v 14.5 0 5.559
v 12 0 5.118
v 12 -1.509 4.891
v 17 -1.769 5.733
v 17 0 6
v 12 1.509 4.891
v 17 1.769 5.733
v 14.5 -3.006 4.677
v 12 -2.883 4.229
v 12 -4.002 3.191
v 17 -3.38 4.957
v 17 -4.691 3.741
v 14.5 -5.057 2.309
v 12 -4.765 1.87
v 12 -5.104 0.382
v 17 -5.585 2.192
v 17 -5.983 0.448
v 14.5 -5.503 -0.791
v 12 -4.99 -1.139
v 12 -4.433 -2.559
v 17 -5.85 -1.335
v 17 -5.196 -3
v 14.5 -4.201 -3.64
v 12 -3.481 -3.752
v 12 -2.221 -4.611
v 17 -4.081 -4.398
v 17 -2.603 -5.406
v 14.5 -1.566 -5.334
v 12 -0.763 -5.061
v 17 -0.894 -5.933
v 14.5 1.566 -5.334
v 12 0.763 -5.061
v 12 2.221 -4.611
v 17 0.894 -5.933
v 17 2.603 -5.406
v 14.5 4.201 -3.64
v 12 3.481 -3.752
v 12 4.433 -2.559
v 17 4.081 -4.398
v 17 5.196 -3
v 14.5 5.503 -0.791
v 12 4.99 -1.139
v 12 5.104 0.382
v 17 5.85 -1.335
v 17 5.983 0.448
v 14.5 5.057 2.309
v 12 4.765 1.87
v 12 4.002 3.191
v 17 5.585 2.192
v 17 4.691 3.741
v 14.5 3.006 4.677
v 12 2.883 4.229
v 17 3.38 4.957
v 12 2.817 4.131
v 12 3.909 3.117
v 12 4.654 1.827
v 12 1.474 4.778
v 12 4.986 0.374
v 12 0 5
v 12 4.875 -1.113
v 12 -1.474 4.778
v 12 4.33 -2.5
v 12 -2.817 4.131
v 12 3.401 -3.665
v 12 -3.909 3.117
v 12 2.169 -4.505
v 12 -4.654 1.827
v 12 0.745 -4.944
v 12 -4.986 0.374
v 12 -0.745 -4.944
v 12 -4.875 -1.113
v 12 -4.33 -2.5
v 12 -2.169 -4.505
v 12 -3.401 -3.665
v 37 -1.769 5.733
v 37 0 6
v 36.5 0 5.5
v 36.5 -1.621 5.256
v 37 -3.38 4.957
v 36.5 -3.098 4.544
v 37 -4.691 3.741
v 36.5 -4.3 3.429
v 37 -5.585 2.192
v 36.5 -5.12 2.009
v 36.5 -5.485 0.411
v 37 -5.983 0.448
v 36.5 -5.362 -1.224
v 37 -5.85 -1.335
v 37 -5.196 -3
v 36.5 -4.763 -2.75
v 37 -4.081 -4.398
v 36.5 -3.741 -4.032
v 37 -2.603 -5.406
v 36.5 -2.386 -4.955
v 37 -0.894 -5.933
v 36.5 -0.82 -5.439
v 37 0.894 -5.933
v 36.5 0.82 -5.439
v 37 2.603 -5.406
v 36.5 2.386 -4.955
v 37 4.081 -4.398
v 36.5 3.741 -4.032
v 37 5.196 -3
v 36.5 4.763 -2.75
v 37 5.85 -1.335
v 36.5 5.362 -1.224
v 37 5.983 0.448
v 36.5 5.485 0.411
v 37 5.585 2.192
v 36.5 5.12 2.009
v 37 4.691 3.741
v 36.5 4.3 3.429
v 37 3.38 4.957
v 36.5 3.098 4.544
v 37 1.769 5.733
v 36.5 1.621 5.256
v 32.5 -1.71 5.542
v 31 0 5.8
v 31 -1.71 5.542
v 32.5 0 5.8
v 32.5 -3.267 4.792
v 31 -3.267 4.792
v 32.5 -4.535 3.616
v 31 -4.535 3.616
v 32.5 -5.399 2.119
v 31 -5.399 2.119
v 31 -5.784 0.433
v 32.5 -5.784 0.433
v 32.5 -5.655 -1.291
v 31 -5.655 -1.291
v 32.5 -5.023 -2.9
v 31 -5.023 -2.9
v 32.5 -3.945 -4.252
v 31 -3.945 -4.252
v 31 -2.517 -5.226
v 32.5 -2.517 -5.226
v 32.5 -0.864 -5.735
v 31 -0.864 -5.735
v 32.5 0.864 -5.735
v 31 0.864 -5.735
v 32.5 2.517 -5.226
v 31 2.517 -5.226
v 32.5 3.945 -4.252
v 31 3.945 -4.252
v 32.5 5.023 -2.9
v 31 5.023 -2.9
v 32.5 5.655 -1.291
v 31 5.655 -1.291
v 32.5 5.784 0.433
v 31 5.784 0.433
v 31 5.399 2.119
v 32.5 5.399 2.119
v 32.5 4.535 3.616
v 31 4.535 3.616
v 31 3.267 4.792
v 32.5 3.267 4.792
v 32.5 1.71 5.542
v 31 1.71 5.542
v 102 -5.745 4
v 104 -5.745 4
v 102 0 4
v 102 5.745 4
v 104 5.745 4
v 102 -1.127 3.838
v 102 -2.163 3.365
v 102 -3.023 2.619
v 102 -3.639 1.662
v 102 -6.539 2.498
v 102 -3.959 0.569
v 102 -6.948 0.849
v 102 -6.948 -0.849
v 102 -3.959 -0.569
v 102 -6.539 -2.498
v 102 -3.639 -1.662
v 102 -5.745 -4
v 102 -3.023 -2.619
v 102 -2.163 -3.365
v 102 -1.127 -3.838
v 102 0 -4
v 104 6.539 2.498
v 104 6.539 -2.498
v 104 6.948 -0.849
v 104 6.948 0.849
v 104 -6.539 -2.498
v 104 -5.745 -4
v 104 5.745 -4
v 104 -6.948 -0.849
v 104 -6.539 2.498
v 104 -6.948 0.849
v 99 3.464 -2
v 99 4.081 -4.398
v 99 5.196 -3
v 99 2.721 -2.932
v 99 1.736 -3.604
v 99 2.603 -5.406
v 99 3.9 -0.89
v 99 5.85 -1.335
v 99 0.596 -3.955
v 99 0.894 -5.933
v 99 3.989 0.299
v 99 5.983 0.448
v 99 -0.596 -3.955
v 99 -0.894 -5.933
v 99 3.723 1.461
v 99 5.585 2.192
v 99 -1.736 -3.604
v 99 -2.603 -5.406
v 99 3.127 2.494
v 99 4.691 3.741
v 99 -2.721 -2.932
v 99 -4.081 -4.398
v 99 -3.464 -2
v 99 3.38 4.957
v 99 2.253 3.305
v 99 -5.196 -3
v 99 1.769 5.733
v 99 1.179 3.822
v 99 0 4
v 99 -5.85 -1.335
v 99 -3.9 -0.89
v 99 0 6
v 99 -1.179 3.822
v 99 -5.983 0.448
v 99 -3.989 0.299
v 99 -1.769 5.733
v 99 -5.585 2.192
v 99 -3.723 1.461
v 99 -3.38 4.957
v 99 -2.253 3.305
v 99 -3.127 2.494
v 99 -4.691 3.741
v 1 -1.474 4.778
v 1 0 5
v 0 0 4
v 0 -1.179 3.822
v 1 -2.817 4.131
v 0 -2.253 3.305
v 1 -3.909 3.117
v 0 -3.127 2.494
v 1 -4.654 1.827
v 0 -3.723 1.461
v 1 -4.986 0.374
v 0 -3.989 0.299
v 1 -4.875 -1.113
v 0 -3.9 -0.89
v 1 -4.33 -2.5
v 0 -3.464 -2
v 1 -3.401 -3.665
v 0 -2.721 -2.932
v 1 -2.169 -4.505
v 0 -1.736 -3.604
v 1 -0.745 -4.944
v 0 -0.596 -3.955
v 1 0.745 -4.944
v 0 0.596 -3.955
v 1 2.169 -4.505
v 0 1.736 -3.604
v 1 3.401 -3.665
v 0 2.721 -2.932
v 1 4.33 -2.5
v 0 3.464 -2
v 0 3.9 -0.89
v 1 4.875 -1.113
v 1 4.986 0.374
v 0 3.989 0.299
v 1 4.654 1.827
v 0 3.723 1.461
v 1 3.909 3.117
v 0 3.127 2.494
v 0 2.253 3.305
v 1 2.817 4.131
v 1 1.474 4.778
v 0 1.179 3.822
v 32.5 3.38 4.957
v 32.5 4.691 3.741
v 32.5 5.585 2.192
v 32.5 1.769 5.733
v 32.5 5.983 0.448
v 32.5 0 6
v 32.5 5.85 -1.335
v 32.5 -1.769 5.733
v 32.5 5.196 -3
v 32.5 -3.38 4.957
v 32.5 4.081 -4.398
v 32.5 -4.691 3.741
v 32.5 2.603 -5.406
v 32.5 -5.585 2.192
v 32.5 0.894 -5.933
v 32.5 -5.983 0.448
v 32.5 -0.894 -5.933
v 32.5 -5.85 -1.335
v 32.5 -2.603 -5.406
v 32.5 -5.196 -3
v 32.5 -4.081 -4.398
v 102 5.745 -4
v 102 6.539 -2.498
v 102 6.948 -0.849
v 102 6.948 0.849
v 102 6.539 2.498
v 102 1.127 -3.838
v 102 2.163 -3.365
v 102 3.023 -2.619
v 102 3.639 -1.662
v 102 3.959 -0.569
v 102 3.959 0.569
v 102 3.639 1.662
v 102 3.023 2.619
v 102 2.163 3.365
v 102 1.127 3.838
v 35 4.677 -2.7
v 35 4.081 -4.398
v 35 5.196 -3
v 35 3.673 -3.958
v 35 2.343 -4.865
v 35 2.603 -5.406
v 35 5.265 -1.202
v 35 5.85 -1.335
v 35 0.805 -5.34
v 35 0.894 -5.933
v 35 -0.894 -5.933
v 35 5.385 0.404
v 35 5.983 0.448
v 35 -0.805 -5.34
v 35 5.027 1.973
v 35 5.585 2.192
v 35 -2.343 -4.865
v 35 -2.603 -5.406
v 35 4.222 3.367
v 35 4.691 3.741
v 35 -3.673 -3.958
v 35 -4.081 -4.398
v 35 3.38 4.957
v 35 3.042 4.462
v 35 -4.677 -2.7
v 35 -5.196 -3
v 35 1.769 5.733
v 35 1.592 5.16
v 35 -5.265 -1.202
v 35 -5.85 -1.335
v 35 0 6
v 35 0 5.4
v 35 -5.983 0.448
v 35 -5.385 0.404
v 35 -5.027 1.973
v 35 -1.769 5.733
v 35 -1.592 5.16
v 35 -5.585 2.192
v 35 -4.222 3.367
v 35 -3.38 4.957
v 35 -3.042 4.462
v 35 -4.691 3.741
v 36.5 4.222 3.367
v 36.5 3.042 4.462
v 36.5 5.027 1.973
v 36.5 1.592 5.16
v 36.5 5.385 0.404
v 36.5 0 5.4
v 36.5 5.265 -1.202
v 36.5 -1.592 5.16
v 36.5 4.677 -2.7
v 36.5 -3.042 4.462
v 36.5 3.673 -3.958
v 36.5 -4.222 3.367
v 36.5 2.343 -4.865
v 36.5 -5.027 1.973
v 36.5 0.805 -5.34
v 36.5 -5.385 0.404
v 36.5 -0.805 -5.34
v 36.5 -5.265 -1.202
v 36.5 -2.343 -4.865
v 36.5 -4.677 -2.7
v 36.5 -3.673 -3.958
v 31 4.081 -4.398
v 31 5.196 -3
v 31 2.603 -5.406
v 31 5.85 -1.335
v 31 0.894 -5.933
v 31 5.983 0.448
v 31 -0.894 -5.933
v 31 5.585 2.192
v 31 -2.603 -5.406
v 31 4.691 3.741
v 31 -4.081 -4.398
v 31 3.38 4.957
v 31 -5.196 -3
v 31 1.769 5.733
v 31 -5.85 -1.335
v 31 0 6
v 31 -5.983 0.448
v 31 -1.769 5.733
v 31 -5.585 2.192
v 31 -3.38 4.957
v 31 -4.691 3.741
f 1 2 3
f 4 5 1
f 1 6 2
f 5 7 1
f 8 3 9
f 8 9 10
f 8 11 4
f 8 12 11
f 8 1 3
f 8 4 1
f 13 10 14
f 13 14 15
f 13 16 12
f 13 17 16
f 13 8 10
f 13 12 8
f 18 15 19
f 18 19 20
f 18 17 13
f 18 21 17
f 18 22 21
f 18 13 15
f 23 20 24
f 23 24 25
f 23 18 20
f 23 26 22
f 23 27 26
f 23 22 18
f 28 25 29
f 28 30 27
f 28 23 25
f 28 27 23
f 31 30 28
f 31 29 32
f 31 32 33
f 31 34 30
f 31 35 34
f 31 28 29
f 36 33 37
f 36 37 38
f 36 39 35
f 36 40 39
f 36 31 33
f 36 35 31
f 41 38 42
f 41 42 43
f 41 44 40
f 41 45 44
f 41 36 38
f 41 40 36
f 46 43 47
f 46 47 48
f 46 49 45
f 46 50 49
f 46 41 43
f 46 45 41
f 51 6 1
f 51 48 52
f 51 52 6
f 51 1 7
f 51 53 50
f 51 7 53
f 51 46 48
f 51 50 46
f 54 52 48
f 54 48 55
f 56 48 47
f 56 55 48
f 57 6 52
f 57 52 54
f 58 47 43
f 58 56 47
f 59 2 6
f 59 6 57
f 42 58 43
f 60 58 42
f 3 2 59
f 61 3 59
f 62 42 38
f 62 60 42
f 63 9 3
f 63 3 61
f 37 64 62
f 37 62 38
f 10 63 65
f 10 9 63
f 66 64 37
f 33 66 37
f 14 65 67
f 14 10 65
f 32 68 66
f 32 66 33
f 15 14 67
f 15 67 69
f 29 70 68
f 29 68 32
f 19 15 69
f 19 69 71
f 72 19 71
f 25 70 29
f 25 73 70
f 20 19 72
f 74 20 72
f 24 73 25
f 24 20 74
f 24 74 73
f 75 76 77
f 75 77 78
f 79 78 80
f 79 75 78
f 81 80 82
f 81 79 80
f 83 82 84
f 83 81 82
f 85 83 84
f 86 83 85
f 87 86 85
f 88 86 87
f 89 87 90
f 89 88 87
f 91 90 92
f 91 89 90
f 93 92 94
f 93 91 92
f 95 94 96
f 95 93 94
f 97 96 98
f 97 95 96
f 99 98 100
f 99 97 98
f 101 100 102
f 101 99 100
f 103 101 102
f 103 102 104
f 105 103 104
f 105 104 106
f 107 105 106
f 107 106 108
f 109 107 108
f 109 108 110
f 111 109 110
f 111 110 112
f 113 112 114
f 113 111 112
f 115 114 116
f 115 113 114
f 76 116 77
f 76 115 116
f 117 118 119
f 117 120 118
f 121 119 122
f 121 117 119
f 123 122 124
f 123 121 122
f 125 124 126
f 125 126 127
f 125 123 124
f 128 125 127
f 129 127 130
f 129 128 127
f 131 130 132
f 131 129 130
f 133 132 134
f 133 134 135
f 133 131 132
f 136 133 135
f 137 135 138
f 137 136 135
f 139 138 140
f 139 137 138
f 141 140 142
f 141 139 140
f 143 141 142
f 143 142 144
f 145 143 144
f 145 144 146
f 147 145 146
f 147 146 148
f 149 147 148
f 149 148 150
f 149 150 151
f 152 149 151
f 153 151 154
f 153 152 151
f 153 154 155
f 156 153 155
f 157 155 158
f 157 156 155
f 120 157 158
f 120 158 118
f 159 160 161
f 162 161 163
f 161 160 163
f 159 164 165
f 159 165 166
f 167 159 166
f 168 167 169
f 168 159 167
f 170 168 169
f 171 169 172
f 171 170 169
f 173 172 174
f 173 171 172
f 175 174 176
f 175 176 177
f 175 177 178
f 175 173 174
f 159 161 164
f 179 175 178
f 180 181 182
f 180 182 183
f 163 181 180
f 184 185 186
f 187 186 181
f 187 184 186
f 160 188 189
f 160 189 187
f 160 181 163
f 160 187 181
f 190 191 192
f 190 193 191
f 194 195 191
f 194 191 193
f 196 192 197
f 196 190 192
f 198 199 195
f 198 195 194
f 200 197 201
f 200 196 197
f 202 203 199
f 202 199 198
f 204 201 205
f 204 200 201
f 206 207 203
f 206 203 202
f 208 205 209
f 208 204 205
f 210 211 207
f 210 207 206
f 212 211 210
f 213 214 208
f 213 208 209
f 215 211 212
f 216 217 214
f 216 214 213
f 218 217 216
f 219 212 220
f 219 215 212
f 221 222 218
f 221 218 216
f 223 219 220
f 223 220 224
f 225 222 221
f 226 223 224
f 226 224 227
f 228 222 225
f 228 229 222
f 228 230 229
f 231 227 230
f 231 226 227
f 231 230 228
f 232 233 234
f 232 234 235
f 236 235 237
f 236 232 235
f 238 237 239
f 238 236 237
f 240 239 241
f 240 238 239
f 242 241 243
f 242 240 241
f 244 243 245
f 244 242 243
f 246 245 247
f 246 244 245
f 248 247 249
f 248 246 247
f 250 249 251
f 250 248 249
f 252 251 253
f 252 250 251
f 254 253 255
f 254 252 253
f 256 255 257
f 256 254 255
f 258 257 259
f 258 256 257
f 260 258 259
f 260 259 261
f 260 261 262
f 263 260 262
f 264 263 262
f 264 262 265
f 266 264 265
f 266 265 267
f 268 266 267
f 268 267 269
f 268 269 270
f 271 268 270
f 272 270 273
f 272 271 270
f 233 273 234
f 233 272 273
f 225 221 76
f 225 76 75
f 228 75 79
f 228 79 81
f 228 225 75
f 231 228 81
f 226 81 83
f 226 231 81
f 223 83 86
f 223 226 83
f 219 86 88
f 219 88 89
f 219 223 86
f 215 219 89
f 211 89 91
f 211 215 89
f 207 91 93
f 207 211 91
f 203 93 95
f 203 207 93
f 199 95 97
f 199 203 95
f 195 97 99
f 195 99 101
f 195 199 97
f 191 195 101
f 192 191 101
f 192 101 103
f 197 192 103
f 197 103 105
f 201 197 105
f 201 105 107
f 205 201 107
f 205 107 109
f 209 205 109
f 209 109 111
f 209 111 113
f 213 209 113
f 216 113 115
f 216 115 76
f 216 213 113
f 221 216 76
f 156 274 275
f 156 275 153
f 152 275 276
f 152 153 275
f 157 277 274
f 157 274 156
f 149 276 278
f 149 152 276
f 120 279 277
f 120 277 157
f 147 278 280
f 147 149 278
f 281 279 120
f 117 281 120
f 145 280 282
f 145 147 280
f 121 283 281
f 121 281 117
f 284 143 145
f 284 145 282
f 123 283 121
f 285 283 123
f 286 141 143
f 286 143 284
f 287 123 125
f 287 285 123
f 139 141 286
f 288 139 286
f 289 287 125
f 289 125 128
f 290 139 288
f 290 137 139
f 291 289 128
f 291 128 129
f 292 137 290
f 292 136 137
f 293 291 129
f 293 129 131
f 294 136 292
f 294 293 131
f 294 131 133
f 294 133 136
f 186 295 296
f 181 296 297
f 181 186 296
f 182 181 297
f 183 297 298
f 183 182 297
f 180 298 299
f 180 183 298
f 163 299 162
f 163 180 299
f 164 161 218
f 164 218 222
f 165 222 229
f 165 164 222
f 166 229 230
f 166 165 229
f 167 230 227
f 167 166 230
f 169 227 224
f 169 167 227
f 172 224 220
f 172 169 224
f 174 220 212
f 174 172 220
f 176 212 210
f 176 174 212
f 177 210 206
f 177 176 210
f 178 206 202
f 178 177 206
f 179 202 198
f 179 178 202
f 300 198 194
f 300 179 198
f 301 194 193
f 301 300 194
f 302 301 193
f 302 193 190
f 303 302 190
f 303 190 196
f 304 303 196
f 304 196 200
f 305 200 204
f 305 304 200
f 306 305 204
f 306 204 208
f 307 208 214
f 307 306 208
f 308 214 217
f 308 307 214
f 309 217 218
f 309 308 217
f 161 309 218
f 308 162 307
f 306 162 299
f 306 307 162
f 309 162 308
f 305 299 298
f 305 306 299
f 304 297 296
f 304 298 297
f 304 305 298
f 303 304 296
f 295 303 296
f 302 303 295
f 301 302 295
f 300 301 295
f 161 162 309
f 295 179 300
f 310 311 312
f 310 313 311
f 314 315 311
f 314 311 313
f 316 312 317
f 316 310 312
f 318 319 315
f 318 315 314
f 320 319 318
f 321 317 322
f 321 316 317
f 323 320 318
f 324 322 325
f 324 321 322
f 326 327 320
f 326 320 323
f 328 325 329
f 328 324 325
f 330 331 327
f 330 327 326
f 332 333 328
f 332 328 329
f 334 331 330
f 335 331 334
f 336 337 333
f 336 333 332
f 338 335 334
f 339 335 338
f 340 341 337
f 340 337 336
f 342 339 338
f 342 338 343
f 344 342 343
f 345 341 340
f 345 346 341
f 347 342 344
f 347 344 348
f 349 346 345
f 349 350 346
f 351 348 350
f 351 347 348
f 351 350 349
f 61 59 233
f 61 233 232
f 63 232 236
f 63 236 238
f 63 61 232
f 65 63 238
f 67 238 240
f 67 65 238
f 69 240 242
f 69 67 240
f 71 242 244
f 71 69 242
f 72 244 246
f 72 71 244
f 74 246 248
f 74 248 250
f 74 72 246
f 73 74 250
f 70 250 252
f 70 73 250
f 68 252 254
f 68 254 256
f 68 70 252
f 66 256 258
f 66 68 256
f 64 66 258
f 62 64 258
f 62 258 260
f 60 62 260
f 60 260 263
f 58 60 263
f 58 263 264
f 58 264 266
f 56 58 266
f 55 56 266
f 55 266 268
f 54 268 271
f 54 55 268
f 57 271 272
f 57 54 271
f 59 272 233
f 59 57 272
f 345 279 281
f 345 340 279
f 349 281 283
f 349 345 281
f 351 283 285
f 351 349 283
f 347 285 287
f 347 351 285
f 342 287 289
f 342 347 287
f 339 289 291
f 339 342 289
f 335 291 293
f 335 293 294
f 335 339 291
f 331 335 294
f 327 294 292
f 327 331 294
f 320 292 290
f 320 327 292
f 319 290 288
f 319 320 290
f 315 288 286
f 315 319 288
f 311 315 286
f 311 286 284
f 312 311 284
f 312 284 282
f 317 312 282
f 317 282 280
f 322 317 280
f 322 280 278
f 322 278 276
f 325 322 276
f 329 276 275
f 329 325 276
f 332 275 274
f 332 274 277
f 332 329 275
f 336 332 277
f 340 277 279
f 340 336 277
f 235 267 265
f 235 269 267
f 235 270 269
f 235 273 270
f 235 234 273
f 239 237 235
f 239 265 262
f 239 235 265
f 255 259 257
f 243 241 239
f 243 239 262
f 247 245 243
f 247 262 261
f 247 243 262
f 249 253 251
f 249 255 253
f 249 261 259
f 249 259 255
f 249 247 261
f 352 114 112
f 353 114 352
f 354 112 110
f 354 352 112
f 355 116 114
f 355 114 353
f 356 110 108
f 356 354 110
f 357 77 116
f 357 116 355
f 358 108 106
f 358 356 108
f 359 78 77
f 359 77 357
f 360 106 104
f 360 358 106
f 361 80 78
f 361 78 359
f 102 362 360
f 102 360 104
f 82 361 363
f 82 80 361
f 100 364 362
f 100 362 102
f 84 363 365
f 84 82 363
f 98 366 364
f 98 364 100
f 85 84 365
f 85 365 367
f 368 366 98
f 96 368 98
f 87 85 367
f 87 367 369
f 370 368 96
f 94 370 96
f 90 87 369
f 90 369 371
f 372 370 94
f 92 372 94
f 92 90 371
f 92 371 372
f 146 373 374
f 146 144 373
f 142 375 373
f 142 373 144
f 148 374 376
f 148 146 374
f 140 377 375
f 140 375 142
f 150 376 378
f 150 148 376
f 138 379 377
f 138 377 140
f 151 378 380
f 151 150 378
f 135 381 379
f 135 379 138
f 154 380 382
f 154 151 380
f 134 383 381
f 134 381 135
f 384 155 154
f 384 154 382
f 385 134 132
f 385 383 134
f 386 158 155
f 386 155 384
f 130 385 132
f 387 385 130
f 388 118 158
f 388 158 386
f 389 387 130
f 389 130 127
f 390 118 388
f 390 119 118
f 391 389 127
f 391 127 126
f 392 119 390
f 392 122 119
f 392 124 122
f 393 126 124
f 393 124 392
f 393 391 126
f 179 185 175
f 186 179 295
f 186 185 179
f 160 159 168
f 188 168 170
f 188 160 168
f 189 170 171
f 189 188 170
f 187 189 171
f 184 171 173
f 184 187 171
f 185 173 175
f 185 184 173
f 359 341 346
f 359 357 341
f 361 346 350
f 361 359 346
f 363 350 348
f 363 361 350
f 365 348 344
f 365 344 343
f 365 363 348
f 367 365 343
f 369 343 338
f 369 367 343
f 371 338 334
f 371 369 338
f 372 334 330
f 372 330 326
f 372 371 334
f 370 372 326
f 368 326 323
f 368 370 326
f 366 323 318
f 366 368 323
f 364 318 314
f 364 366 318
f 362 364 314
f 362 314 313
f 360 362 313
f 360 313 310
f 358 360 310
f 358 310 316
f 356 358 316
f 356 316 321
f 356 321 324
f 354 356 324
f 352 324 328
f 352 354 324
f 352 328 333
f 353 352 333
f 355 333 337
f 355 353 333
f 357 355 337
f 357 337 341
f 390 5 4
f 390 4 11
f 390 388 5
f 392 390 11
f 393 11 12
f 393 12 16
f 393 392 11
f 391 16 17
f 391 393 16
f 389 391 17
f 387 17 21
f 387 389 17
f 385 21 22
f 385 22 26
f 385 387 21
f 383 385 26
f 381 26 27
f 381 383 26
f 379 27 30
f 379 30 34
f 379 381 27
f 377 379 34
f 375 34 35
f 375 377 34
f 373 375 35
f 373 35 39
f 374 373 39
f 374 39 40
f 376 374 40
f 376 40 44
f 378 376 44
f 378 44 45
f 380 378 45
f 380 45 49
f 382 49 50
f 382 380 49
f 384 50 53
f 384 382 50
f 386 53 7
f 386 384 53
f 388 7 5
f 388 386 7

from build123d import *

# Parameters (mm, degrees)
CHANFREIN1_SIZE         = 1
CHANFREIN2_SIZE         = 0.5
ENL_V_MAT_EXTRU_1_REACH = 106.47
ESQUISSE2_W             = 5.137351374
ESQUISSE2_H             = 15.268552686


with BuildPart() as part:
    # Esquisse1 → Révolution1 (revolve)
    with BuildSketch(Plane.XY, mode=Mode.PRIVATE) as r_volution1_sk:
        Polygon((0, 0), (0, 5), (12, 5), (12, 5.118365096), (17, 6), (31, 6), (31, 5.8), (32.5, 5.8), (32.5, 6), (35, 6), (35, 5.4), (36.5, 5.4), (36.5, 6), (99, 6), (99, 4), (102, 4), (102, 7), (104, 7), (104, 0), (103.330760558, 0), align=None)
    revolve(r_volution1_sk.sketch.rotate(Axis((0, 0, 0), (1, 0, 0)), 90), axis=Axis((0, 0, 0), (1, 0, 0)))

    # Chanfrein1
    chanfrein1_edges = [part.edges().sort_by_distance(p)[0] for p in [
        (0, 0, -5),
    ]]
    chamfer(chanfrein1_edges, length=CHANFREIN1_SIZE)

    # Chanfrein2
    chanfrein2_edges = [part.edges().sort_by_distance(p)[0] for p in [
        (36.5, 0, -6),
    ]]
    chamfer(chanfrein2_edges, length=CHANFREIN2_SIZE)

    # Esquisse2 → Enlèv. mat.-Extru.1 (cut, up to next)
    with BuildSketch(Plane(origin=(104, 0, 0), x_dir=(0, 0, -1), z_dir=(1, 0, 0)), mode=Mode.PRIVATE) as enl_v_mat_extru_1_sk1:
        with Locations((-6.568675687, -0.086100861)):
            Rectangle(ESQUISSE2_W, ESQUISSE2_H)
    enl_v_mat_extru_1_tool1 = extrude(enl_v_mat_extru_1_sk1.sketch, amount=-ENL_V_MAT_EXTRU_1_REACH, mode=Mode.PRIVATE) & part.part
    # Esquisse2 → Enlèv. mat.-Extru.1 (cut, up to next)
    with BuildSketch(Plane(origin=(104, 0, 0), x_dir=(0, 0, -1), z_dir=(1, 0, 0)), mode=Mode.PRIVATE) as enl_v_mat_extru_1_sk2:
        with Locations((6.568675687, -0.086100861)):
            Rectangle(ESQUISSE2_W, ESQUISSE2_H)
    enl_v_mat_extru_1_tool2 = extrude(enl_v_mat_extru_1_sk2.sketch, amount=-ENL_V_MAT_EXTRU_1_REACH, mode=Mode.PRIVATE) & part.part
    add(enl_v_mat_extru_1_tool1.solids().sort_by_distance((104, -0.086101, 6.568676))[0], mode=Mode.SUBTRACT)
    add(enl_v_mat_extru_1_tool2.solids().sort_by_distance((104, -0.086101, -6.568676))[0], mode=Mode.SUBTRACT)


solid = part.part
